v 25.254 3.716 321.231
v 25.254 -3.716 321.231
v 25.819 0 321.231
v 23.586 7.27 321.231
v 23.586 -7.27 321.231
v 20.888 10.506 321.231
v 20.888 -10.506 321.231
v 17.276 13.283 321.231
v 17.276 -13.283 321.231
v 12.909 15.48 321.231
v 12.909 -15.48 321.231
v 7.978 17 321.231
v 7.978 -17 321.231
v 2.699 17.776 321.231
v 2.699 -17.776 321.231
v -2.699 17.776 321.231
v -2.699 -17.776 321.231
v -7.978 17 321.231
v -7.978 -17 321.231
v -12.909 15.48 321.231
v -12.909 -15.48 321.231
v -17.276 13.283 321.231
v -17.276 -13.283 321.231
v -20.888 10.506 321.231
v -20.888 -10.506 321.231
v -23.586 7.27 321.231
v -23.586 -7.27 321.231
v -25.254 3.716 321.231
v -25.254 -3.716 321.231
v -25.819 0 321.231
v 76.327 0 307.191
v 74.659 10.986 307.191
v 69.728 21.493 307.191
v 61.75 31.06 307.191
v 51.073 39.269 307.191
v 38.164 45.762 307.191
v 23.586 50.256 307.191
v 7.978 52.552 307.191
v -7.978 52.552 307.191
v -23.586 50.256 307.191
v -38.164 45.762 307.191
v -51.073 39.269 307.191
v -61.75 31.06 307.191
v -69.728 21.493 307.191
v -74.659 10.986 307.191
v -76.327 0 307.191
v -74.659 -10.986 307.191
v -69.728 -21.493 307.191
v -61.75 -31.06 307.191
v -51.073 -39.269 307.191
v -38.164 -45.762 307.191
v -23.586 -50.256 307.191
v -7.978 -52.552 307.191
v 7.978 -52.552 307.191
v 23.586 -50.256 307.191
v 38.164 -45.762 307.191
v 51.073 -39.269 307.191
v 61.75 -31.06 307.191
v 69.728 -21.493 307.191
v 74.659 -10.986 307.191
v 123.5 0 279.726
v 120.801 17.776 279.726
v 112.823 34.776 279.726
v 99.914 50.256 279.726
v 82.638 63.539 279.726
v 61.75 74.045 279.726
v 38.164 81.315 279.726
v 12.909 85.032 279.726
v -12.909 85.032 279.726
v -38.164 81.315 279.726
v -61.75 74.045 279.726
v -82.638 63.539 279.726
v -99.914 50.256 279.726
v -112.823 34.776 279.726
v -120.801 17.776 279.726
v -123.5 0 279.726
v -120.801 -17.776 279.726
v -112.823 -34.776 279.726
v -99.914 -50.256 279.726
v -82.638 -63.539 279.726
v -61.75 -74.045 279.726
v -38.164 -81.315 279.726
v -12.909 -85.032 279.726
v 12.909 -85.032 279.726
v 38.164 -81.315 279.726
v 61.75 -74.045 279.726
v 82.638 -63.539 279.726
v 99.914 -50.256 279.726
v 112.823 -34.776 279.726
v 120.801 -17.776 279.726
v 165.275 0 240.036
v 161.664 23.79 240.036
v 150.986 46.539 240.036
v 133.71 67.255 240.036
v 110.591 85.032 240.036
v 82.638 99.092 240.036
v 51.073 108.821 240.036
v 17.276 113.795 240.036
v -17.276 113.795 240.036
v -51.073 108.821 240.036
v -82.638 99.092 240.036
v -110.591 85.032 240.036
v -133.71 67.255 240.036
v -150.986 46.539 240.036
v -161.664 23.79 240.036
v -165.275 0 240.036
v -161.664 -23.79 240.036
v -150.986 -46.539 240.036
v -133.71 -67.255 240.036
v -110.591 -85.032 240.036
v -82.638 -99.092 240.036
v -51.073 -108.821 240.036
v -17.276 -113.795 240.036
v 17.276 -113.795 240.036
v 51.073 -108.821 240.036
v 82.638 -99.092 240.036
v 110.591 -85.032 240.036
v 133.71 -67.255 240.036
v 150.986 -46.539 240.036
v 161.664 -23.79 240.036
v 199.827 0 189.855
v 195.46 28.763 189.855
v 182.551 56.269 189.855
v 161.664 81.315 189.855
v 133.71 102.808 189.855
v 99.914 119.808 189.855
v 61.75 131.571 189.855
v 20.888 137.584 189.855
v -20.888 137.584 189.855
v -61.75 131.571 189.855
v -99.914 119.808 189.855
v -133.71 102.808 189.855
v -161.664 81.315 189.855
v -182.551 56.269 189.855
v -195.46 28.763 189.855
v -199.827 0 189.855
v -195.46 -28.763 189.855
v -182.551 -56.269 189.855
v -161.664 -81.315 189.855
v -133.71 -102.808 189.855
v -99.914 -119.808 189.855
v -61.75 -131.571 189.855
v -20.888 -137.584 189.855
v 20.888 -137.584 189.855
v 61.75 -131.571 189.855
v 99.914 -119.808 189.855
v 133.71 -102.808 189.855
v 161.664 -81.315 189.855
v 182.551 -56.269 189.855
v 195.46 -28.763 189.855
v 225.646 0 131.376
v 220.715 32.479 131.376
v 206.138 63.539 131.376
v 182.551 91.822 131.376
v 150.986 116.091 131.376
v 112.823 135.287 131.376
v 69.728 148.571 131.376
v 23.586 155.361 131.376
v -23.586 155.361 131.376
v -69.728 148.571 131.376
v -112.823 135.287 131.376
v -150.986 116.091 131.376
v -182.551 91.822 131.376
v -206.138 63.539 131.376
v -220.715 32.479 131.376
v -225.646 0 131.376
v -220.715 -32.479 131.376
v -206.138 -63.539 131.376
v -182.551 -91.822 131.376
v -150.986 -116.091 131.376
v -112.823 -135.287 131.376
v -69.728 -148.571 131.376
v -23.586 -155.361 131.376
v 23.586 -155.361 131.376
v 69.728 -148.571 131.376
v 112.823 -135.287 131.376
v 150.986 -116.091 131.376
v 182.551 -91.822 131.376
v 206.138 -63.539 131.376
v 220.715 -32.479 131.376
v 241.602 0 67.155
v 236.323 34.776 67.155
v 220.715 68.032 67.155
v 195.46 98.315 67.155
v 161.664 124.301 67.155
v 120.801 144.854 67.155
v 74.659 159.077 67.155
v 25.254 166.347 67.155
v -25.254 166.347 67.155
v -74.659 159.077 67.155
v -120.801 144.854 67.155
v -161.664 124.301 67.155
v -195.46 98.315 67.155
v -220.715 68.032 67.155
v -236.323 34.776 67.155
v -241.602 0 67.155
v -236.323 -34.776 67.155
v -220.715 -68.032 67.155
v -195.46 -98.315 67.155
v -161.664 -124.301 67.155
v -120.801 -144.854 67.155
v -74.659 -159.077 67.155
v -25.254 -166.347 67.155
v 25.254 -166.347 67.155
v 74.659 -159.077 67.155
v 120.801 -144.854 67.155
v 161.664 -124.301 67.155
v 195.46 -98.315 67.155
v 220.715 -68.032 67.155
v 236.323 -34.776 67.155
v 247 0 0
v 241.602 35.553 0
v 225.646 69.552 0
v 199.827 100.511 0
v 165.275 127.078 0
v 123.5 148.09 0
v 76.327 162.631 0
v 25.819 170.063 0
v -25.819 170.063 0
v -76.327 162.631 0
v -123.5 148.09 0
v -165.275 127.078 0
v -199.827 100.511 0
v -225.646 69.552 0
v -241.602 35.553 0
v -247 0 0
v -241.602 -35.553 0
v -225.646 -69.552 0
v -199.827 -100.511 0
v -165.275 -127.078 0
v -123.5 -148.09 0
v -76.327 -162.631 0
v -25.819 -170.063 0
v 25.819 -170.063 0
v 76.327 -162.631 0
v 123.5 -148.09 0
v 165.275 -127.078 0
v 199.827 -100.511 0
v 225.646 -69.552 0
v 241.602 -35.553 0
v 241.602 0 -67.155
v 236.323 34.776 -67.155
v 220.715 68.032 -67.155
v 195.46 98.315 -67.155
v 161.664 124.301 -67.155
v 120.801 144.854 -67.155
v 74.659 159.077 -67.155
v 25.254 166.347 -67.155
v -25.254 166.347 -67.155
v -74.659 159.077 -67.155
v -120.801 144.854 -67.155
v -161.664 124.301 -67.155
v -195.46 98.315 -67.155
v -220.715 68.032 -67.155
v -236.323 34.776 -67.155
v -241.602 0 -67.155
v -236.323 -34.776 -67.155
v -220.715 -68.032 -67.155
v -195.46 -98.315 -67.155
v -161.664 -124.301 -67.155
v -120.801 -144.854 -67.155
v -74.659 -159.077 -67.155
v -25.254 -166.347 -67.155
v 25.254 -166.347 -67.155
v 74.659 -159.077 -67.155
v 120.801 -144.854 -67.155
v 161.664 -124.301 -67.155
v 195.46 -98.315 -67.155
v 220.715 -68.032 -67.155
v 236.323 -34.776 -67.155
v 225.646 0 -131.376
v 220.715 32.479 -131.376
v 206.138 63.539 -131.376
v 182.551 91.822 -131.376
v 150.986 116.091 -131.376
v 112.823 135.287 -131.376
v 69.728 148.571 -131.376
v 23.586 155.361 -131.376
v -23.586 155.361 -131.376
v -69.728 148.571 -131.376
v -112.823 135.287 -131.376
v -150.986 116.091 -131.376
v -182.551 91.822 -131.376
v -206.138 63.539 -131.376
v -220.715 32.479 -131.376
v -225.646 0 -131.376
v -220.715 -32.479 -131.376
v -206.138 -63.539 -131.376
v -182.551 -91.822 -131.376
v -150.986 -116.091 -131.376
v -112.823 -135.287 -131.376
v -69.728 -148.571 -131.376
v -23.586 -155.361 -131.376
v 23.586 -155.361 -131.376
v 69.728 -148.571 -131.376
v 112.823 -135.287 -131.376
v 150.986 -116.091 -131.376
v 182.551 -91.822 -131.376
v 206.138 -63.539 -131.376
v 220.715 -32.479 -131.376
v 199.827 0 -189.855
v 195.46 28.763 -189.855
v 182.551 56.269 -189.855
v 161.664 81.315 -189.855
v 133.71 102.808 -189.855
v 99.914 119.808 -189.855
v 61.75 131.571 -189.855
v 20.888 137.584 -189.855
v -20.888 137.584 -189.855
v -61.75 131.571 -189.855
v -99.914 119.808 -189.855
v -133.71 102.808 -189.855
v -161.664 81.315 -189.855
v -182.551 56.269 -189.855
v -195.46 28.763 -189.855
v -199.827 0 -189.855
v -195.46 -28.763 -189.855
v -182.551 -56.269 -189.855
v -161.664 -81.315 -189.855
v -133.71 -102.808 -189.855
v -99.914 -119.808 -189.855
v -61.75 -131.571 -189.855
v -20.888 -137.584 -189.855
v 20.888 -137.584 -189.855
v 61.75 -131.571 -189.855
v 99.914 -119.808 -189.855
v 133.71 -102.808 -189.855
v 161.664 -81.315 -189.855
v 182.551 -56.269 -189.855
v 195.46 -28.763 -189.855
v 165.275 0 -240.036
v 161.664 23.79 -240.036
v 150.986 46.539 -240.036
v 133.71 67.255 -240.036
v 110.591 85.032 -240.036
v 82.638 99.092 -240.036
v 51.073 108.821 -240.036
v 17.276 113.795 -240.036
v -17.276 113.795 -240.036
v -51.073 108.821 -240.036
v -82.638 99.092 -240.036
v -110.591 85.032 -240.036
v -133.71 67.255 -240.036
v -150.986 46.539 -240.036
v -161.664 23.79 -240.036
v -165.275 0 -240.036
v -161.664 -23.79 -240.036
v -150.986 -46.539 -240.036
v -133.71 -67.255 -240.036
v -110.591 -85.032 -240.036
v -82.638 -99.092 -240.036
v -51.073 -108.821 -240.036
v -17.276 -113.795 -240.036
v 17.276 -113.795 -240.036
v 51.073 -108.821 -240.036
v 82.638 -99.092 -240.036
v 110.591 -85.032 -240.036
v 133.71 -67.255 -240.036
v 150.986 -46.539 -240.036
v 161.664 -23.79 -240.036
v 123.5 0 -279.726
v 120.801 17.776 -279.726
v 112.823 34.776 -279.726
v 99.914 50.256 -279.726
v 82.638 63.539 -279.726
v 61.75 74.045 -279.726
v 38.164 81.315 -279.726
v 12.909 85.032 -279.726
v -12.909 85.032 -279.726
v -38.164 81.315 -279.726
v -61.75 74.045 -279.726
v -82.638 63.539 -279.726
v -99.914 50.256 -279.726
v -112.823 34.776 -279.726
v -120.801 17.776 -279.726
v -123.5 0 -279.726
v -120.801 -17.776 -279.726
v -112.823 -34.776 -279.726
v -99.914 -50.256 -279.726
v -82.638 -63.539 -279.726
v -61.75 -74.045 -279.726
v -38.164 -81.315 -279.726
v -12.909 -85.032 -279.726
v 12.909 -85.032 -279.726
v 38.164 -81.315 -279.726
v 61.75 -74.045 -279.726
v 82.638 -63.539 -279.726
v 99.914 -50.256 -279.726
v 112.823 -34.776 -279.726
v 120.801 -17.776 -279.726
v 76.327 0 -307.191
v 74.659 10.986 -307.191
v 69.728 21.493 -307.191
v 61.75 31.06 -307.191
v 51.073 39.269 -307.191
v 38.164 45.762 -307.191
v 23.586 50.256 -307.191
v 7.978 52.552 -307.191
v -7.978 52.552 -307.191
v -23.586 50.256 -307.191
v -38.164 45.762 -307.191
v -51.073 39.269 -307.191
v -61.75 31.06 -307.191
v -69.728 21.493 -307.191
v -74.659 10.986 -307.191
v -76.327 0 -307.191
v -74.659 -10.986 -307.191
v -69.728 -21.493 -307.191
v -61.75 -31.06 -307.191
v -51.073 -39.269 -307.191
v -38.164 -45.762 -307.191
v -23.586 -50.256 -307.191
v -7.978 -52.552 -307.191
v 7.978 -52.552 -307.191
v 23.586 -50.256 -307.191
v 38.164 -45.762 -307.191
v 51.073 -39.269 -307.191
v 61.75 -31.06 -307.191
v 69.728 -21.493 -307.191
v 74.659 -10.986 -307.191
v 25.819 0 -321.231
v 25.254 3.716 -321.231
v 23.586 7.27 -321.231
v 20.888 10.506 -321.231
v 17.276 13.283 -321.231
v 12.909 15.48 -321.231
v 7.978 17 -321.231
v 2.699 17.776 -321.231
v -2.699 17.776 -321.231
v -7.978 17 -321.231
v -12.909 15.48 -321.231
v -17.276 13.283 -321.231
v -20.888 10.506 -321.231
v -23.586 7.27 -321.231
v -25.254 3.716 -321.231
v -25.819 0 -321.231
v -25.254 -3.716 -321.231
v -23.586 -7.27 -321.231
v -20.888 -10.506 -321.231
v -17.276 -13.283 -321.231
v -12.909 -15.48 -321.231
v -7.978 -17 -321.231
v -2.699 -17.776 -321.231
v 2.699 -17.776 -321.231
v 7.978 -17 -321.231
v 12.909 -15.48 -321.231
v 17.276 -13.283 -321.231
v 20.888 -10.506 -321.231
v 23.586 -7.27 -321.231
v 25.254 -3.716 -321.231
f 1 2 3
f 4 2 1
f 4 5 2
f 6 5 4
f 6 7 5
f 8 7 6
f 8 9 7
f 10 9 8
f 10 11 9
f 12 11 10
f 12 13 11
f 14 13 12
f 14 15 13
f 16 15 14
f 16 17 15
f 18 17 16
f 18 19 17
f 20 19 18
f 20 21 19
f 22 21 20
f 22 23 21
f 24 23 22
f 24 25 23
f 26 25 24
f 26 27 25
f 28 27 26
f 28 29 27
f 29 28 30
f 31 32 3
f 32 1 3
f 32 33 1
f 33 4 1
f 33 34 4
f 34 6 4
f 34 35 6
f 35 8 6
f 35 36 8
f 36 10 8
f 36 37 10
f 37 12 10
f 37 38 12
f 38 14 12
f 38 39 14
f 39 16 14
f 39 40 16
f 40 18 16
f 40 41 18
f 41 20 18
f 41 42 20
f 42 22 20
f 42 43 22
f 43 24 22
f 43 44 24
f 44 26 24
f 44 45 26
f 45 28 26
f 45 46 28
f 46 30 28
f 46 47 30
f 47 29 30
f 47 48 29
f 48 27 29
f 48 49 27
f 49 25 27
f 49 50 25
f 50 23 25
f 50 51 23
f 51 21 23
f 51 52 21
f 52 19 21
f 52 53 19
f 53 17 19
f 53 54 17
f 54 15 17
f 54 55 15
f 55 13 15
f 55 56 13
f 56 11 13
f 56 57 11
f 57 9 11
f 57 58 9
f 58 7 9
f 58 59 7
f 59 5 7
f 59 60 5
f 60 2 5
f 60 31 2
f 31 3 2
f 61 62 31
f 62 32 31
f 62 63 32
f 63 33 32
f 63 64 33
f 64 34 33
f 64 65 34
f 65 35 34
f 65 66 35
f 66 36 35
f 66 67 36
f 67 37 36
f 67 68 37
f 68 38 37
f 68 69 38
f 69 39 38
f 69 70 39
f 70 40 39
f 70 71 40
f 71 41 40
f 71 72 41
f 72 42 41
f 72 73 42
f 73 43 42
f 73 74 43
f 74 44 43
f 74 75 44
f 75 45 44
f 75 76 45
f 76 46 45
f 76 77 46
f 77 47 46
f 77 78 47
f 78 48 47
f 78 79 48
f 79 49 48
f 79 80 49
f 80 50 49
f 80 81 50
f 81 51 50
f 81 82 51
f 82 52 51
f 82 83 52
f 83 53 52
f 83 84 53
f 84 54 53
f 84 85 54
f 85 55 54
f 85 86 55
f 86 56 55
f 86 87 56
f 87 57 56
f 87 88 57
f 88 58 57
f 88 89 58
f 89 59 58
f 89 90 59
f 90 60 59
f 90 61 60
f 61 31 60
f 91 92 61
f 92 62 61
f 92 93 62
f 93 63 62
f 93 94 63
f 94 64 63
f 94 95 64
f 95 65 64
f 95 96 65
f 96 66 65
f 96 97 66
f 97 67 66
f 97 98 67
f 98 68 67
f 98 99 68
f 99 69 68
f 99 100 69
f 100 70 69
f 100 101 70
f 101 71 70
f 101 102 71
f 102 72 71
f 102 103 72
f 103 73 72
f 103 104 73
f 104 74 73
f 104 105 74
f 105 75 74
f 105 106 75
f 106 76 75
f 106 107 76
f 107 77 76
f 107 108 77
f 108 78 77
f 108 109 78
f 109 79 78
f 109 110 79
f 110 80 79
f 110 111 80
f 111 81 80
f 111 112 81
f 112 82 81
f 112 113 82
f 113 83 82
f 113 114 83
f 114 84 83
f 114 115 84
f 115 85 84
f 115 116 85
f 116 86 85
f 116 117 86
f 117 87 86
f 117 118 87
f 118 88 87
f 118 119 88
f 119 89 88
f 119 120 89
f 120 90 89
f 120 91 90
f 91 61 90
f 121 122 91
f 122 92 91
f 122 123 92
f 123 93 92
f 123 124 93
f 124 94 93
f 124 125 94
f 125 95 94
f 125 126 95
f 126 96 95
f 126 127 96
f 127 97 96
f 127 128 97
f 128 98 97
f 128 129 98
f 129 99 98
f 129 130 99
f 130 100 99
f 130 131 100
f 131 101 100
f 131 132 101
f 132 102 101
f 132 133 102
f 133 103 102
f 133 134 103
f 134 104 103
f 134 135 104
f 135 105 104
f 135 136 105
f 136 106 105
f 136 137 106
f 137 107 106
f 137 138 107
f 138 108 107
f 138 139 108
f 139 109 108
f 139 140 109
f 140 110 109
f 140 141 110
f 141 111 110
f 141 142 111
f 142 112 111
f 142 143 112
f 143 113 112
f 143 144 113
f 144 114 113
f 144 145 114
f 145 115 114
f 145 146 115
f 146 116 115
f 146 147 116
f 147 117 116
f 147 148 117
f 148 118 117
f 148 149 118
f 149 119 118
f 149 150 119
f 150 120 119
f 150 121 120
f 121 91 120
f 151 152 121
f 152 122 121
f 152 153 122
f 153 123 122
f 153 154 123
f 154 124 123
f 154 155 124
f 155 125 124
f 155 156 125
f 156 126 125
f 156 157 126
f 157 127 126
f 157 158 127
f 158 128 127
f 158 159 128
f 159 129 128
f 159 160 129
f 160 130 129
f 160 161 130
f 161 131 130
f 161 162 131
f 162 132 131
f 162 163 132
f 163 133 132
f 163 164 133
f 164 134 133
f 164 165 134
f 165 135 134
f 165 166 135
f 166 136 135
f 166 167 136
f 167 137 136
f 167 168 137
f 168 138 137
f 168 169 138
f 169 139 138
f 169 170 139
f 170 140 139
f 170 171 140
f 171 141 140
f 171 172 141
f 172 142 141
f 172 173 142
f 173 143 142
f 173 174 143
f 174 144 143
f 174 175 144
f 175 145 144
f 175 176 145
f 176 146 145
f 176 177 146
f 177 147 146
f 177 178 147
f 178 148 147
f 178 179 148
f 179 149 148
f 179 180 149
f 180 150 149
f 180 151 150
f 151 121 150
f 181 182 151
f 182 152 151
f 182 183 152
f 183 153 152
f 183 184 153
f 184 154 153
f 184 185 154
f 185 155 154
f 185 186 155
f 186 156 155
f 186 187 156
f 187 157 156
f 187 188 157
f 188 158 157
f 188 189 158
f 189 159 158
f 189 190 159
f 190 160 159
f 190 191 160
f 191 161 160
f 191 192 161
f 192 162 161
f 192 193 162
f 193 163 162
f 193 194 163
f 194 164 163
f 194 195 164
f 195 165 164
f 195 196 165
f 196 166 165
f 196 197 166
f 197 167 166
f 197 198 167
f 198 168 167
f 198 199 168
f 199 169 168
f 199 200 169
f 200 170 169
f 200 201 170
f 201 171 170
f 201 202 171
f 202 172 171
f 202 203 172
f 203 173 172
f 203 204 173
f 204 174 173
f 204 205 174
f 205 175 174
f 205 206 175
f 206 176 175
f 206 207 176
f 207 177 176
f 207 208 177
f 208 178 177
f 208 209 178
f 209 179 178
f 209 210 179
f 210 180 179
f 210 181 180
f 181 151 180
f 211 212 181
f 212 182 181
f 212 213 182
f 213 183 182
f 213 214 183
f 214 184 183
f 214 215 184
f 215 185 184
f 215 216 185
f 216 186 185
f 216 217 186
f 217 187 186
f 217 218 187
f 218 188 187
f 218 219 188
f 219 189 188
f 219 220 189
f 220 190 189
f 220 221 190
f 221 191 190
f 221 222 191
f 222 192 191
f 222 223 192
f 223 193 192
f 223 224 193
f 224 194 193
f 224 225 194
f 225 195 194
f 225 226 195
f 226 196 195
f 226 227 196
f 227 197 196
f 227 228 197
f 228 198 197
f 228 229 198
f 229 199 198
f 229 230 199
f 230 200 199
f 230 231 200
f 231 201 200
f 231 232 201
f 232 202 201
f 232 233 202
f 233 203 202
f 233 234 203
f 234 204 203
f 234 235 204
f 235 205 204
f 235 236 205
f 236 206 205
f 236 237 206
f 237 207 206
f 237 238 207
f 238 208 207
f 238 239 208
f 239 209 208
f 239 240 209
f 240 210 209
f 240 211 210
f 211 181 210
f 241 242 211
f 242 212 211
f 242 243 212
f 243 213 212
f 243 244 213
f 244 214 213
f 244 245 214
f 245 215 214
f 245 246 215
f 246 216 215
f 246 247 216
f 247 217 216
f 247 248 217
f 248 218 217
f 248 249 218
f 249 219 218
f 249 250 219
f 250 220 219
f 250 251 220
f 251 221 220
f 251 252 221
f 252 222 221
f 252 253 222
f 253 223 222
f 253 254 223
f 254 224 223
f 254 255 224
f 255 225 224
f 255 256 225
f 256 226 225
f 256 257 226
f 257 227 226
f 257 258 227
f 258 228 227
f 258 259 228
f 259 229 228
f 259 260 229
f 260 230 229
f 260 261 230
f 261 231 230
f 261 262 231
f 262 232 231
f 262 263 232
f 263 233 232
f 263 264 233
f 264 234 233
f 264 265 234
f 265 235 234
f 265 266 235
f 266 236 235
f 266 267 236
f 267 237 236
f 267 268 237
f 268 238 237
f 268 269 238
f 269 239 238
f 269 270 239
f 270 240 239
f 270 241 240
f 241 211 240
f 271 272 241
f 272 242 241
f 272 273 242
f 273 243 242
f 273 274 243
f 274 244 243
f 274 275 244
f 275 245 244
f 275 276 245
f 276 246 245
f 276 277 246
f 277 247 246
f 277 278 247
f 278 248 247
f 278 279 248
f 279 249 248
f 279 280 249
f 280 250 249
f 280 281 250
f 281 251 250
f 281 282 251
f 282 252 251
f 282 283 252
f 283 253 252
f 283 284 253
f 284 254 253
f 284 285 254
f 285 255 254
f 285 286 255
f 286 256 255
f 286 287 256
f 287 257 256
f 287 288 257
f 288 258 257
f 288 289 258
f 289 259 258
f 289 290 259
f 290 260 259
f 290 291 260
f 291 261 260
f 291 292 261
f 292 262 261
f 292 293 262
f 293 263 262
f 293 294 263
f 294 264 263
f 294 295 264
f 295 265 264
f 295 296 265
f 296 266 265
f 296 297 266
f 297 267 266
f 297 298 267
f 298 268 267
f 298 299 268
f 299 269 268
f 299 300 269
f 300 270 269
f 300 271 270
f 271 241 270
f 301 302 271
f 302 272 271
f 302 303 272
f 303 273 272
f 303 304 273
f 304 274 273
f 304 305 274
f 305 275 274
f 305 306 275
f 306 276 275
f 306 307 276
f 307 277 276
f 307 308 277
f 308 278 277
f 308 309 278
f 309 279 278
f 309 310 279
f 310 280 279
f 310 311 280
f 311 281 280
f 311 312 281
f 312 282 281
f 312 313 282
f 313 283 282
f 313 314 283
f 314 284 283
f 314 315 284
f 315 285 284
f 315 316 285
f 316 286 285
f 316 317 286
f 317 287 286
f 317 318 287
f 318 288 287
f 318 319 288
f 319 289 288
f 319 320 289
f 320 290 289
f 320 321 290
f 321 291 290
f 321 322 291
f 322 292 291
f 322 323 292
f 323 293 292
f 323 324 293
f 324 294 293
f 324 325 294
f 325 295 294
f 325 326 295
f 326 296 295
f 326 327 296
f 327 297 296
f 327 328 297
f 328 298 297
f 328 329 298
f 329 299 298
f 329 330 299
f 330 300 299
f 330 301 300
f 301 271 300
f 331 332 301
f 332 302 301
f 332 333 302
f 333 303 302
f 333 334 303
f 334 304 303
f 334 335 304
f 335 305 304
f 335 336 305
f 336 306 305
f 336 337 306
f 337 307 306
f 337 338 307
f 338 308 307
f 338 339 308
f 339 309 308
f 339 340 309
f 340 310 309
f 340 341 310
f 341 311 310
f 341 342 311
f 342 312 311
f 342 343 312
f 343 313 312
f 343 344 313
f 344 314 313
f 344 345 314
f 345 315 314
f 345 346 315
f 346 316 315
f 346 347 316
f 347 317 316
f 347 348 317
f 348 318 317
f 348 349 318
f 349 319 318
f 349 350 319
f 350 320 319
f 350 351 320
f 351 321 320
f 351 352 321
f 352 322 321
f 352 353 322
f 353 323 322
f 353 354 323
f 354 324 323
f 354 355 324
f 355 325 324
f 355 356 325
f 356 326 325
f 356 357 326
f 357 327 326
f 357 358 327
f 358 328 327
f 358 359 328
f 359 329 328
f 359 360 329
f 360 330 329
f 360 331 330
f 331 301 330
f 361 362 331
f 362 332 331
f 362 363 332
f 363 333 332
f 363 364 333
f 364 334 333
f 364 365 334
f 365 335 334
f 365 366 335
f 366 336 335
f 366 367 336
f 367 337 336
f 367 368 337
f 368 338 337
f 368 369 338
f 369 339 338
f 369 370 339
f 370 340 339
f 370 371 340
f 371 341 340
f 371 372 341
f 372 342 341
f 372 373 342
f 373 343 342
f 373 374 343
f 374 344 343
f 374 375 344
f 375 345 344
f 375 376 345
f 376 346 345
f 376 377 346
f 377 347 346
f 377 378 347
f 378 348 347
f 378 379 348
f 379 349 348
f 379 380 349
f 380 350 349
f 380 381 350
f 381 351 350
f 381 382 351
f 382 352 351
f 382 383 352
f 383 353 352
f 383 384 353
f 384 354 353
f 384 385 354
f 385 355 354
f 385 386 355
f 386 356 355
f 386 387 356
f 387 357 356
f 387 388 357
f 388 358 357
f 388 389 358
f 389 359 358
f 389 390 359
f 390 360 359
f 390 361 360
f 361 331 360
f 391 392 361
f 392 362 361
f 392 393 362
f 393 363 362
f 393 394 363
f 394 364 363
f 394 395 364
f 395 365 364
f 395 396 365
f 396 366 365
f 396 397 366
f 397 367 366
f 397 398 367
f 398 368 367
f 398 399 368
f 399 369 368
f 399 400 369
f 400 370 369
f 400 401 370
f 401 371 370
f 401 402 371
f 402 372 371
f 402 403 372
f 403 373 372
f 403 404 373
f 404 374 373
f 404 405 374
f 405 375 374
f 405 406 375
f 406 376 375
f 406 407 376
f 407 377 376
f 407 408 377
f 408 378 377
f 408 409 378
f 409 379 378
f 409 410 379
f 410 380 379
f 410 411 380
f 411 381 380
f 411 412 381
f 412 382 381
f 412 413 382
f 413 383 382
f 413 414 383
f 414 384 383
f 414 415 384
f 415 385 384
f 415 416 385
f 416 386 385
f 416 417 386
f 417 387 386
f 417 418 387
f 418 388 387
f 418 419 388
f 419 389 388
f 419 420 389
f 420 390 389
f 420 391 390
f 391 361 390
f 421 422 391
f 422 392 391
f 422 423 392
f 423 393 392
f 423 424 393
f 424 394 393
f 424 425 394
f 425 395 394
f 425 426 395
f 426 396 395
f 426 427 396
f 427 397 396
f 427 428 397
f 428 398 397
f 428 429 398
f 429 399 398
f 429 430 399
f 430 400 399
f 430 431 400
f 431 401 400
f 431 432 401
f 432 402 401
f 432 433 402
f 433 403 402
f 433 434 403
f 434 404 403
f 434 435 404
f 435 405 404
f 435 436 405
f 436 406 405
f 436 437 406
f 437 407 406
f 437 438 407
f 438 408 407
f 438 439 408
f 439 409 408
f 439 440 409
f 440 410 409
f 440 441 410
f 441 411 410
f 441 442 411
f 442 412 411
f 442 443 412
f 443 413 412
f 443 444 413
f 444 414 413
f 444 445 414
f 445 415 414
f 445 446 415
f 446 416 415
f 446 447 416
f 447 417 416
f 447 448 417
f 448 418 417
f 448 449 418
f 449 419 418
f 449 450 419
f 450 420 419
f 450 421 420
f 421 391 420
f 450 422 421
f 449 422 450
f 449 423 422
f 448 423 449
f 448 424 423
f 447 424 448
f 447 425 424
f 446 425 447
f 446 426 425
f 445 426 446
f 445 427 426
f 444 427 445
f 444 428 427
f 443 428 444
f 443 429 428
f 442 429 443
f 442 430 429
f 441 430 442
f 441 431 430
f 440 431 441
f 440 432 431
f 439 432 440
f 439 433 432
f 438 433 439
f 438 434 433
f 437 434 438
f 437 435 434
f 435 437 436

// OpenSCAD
// Generated by SolidPython 1.0.1 on 2020-07-29 00:46:50


scale(v = [13, 9, 17]) {
	sphere(r = 19);
}
/***********************************************
*********      SolidPython code:      **********
************************************************
 
# import packages: SolidPython
from solid import *
from solid.utils import *
from itertools import chain, combinations, permutations


class Resize:

    def __init__(self, scad_file):
        self.scad_file = scad_file
        #self.scad_file = import_scad(scad_file)
        # cone/cylinder param:
        self.r1 = 0
        self.r2 = 0
        self.h = 0
        # rectangular prism param:
        self.w = 0
        self.l = 0
        # ellipse param:
        self.r = 0

    # import OpenScad code (file name corresponds to shape)


    # classify shape + parameters
    def assign(self, param1, param2, param3):
        if self.scad_file == 'cone.scad':
            self.r1 = param1
            self.r2 = param2
            self.h = param3
        elif self.scad_file == 'cylinder.scad':
            self.r1 = param1
            self.r2 = param2
            self.h = param3
        elif self.scad_file == 'rectangularPrism.scad':
            self.h = param1
            self.l = param2
            self.w = param3
        else:
            self.r = param1
            self.h = param2

    # resize parameters
    def iterate(self):
        x = range(3, 20, 2)
        i = 1
        if self.scad_file == 'cone.scad':
            tempList = list(permutations(x, 2))
            for temp in tempList:
                param1 = temp[0]
                param2 = temp[1]
                filepath = 'produced_scad_files/' + 'cone' + str(param1) + '_' + str(param2) + '_' + '.scad'
                scad_render_to_file(cylinder(h=param1, r1=param2, r2=0), filepath)

        elif self.scad_file == 'cylinder.scad':
            tempList = list(permutations(x, 3))
            for temp in tempList:
                param1 = temp[0]
                param2 = temp[1]
                filepath = 'produced_scad_files/' + 'cylinder' + str(param1) + '_' + str(param2) + '_' + '.scad'
                scad_render_to_file(cylinder(h=param1, r1=param2, r2=param2), filepath)

        elif self.scad_file == 'rectangularPrism.scad':
            tempList = list(permutations(x, 3))
            for temp in tempList:
                param1 = temp[0]
                param2 = temp[1]
                param3 = temp[2]
                filepath = 'produced_scad_files/' + 'rectangularPrism' + str(param1) + '_' + str(param2) + '_' + str(
                    param3) + '.scad'
                scad_render_to_file(cube(size=(param1, param2, param3)), filepath)

        elif self.scad_file == 'ellipse.scad':
            tempList = list(permutations(x, 4))
            for temp in tempList:
                param1 = temp[0]
                param2 = temp[1]
                param3 = temp[2]
                param4 = temp[3]
                filepath = 'produced_scad_files/' + 'ellipse' + str(param1) + '_' + str(param2) + '_' + str(param3) + '_' + str(param4) + '.scad'
                scad_render_to_file(scale([param1, param2, param3])(sphere(r=param4)), filepath)

    def render_to_scadfile(self):
        scad_render_to_file(scad, 'example.scad') 
 
************************************************/
